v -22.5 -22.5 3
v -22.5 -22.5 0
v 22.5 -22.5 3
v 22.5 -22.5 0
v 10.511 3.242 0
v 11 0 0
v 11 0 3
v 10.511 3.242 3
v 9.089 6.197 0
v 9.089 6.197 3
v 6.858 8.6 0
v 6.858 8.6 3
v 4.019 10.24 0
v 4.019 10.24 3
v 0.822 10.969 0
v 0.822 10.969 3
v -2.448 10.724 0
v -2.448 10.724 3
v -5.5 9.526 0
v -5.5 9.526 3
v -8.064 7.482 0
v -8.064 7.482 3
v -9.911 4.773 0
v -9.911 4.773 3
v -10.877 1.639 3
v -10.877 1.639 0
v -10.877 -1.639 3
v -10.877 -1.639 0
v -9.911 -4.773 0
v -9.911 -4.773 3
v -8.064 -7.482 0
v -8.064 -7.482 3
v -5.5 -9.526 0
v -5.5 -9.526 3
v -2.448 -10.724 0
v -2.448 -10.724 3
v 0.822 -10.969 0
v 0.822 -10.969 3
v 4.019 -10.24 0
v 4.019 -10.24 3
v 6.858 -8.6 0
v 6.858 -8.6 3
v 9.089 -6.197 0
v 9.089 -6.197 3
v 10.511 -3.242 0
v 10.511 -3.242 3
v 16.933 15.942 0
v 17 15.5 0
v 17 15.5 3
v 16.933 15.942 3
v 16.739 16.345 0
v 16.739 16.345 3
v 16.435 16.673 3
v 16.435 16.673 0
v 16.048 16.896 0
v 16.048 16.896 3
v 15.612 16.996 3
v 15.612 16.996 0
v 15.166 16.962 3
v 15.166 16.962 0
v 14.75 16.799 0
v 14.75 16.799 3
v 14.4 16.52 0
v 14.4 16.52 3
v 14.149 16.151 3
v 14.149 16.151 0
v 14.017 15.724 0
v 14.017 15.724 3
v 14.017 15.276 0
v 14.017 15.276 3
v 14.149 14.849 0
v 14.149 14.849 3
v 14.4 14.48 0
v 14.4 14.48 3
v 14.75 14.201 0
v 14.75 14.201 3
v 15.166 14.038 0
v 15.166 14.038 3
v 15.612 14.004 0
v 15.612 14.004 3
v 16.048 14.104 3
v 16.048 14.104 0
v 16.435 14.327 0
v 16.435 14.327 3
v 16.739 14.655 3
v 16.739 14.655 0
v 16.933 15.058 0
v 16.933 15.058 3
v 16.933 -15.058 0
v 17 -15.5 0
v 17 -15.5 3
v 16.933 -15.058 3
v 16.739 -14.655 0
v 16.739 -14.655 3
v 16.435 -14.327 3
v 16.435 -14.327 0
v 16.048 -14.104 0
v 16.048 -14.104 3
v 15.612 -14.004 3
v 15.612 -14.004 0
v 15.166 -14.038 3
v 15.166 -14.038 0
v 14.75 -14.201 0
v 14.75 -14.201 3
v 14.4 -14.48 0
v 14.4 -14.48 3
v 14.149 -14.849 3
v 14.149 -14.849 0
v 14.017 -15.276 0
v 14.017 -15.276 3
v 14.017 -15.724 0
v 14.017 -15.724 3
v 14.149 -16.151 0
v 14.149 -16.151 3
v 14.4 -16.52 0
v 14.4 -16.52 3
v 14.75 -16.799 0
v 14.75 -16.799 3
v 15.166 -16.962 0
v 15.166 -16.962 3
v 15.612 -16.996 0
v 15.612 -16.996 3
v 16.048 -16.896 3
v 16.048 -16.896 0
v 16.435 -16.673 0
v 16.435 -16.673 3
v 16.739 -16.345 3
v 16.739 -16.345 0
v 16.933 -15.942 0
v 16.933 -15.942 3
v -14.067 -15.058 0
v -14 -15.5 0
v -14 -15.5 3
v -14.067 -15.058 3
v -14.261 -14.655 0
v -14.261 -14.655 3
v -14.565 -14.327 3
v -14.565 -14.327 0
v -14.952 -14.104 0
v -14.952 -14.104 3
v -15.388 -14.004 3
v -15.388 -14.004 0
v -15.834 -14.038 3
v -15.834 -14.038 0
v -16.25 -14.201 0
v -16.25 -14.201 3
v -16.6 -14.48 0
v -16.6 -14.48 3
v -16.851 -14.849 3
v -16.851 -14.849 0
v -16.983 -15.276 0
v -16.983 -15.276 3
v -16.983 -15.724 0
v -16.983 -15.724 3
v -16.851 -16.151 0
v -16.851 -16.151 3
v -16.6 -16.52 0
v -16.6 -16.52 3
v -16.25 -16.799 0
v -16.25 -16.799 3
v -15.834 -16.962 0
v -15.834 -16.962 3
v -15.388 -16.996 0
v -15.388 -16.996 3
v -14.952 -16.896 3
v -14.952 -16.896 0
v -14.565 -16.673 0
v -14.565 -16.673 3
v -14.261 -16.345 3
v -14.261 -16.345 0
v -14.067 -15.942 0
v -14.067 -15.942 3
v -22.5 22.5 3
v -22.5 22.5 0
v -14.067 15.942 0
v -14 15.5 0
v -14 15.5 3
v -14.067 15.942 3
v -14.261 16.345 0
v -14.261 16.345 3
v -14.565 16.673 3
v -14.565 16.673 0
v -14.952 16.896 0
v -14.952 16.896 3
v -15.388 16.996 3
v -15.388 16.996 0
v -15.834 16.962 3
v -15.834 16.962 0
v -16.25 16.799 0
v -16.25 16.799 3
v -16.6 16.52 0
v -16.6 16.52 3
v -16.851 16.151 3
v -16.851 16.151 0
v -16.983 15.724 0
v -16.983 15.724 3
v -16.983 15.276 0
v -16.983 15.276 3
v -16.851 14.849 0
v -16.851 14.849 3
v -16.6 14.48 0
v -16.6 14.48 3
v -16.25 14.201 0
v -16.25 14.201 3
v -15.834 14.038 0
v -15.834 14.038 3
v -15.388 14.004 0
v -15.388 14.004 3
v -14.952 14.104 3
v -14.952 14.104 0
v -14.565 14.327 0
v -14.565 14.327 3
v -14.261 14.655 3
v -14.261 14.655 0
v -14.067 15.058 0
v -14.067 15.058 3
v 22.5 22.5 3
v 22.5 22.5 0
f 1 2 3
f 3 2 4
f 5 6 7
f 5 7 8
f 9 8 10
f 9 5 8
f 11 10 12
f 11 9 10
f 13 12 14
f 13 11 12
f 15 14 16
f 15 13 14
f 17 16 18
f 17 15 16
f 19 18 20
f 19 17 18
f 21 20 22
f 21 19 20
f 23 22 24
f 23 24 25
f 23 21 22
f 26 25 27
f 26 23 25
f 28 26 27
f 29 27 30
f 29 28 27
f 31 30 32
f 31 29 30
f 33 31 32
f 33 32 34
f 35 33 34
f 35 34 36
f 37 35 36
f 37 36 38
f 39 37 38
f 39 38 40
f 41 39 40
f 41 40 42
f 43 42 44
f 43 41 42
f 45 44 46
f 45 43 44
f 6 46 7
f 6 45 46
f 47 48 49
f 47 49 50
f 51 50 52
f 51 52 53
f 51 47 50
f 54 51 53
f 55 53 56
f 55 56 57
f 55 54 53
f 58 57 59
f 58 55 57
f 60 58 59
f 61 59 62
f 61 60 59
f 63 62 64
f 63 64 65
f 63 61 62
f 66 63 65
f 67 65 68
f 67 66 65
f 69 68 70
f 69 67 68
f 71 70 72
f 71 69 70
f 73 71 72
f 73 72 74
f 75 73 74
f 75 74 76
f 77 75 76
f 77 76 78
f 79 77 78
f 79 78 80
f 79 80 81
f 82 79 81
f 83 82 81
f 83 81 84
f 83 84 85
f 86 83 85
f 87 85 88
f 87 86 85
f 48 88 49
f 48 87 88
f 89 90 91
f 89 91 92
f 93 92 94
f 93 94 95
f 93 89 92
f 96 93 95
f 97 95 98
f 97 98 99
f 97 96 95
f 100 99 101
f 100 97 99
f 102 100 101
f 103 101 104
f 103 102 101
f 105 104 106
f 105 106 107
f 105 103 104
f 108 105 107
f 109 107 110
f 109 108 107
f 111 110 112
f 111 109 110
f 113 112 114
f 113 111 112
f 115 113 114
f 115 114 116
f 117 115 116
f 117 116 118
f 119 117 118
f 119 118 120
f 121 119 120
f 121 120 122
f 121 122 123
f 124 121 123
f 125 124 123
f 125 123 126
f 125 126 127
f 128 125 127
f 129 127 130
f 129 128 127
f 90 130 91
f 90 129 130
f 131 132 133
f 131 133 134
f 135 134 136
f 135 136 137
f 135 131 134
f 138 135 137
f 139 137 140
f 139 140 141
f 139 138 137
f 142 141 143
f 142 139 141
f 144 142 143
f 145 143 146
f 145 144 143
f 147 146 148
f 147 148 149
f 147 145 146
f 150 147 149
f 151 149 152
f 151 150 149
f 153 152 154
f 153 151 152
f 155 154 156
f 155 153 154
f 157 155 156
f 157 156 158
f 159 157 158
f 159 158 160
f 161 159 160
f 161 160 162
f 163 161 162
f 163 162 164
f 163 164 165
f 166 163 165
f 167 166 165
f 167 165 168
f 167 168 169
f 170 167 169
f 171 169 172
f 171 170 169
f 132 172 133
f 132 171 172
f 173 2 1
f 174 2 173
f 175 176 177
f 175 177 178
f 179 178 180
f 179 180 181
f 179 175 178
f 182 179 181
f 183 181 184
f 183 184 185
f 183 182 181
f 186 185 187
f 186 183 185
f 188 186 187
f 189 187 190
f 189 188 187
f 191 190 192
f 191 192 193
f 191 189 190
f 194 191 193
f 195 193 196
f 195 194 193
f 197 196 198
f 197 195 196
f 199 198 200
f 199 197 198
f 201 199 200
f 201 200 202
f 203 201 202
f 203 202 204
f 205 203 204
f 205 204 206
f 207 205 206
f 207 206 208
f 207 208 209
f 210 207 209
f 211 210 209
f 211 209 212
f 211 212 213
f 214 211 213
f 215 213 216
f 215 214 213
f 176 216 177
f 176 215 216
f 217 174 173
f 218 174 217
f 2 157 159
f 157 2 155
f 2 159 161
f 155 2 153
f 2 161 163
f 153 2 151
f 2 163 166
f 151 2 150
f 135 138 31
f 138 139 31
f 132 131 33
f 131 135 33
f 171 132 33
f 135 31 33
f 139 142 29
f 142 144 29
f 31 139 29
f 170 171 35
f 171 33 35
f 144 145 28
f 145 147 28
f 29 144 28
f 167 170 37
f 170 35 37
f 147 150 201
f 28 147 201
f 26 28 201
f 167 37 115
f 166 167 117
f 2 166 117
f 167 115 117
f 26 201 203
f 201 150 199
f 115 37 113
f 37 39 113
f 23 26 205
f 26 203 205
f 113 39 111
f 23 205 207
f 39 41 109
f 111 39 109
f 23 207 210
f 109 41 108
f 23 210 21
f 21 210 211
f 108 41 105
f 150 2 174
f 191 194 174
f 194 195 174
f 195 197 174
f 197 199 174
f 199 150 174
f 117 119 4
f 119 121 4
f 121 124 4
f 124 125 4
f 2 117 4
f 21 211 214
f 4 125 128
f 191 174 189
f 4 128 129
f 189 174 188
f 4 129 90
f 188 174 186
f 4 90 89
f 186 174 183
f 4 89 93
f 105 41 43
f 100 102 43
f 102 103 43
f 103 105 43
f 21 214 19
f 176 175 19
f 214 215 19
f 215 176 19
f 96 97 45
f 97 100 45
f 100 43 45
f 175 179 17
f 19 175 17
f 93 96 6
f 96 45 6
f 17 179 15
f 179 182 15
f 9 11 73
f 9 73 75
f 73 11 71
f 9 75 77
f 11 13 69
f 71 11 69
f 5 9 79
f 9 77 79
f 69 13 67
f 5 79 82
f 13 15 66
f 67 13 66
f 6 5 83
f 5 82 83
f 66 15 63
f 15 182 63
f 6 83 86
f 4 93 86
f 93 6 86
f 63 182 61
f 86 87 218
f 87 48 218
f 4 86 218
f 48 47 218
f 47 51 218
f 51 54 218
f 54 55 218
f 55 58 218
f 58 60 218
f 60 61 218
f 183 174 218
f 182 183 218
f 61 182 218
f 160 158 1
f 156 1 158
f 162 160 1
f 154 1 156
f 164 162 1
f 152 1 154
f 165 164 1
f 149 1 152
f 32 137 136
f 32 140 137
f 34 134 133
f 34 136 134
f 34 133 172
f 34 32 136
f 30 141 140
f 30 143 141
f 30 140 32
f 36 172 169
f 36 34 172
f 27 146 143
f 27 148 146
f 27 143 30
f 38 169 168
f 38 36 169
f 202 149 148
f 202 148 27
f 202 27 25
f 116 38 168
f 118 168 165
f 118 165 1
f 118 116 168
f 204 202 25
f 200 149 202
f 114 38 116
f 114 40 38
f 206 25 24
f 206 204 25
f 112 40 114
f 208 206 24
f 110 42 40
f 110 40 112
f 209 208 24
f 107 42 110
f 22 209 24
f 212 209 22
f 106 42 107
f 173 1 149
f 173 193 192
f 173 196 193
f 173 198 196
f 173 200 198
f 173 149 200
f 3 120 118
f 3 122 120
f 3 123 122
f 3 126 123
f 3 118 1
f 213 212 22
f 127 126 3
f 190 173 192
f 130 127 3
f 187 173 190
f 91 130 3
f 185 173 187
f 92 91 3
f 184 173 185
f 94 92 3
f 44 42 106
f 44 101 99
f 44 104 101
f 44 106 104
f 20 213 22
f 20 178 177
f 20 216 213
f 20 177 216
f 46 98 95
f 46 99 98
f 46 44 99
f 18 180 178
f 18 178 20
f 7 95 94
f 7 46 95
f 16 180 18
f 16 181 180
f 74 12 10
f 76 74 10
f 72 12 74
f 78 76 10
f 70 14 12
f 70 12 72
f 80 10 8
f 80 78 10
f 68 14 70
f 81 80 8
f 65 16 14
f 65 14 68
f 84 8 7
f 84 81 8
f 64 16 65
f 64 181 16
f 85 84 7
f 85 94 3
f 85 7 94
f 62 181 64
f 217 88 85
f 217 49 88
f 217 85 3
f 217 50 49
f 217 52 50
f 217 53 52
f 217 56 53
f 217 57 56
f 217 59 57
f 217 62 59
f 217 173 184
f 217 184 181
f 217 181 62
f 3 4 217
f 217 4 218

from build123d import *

# Parameters (mm, degrees)
SKETCH1_W           = 45
SKETCH1_H           = 45
SKETCH1_R           = 11
SKETCH1_R_2         = 1.5
BOSS_EXTRUDE1_DEPTH = 3


with BuildPart() as part:
    # Sketch1 → Boss-Extrude1 (new body)
    with BuildSketch(Plane.XY):
        Rectangle(SKETCH1_W, SKETCH1_H)
        Polygon((20.15, -20.15), (20.15, -16.735786438), (20.15, 16.735786438), (16.735786438, 20.15), (-16.735786438, 20.15), (-20.15, 16.735786438), (-20.15, 16.077064234), (-20.15, -16.735786438), (-20.15, -20.15), (-16.735786438, -20.15), (16.735786438, -20.15), align=None, mode=Mode.SUBTRACT)
        Polygon((16.735786438, -20.15), (20.15, -20.15), (20.15, -16.735786438), (20.15, 16.735786438), (16.735786438, 20.15), (-16.735786438, 20.15), (-20.15, 16.735786438), (-20.15, 16.077064234), (-20.15, -16.735786438), (-20.15, -20.15), (-16.735786438, -20.15), align=None)
        Circle(SKETCH1_R, mode=Mode.SUBTRACT)
        with Locations((15.5, -15.5)):
            Circle(SKETCH1_R_2, mode=Mode.SUBTRACT)
        with Locations((15.5, 15.5)):
            Circle(SKETCH1_R_2, mode=Mode.SUBTRACT)
        with Locations((-15.5, -15.5)):
            Circle(SKETCH1_R_2, mode=Mode.SUBTRACT)
        with Locations((-15.5, 15.5)):
            Circle(SKETCH1_R_2, mode=Mode.SUBTRACT)
    extrude(amount=BOSS_EXTRUDE1_DEPTH)


solid = part.part
